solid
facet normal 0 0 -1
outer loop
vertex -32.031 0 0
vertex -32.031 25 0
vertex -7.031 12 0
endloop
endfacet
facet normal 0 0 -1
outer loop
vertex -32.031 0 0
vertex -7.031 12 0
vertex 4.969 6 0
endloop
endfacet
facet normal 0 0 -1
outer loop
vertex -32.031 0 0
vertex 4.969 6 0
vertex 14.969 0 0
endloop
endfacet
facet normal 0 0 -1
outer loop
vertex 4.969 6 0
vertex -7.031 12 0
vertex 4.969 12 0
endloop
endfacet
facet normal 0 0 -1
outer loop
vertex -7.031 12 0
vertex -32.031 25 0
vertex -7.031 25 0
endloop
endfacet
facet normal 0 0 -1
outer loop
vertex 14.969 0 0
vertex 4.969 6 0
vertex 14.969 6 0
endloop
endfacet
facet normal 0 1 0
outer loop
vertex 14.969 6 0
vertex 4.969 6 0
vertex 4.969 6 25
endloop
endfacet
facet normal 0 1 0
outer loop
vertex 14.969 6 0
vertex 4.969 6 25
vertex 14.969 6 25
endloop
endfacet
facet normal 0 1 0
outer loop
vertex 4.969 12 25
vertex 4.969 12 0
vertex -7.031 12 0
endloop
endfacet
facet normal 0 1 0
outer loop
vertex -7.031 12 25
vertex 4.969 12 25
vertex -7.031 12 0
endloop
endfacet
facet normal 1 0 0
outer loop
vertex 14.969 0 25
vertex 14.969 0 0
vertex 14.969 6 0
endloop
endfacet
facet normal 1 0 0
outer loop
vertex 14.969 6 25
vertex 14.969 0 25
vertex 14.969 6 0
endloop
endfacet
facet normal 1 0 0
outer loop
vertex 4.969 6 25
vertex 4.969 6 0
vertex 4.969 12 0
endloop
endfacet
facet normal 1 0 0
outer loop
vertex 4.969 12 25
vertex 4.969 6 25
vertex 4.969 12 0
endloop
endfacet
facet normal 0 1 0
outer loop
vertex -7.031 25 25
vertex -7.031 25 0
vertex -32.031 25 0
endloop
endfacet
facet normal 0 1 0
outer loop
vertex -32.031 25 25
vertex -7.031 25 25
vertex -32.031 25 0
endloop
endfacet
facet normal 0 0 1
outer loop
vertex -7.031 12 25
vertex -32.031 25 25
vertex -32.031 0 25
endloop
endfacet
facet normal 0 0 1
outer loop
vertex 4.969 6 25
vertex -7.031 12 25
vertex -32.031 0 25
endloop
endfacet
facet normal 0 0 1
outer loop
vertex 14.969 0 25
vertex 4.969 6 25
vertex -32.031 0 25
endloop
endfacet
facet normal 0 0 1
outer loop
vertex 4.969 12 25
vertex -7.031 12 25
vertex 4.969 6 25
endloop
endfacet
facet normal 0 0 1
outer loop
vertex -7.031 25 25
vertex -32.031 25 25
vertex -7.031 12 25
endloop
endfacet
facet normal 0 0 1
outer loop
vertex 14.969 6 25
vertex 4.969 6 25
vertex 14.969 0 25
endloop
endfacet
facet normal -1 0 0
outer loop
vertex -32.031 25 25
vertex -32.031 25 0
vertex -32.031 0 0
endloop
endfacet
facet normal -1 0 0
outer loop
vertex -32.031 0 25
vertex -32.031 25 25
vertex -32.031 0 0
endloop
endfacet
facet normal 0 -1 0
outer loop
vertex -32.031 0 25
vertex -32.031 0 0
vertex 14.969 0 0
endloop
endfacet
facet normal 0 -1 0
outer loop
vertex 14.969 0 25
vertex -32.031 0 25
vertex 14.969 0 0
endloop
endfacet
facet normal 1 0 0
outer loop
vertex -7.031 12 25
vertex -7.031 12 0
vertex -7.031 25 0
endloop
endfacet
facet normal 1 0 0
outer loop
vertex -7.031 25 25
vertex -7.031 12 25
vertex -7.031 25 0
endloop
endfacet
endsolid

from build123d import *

# Parameters (mm, degrees)
F0_W     = 10
F0_H     = 6
F1_DEPTH = 25


with BuildPart() as f1:
    # F0 (on Top) → F1 (new body)
    with BuildSketch(Plane.XY):
        Polygon((-7.03125, 25), (-32.03125, 25), (-32.03125, 0), (-7.03125, 0), (-7.03125, 12), align=None)
        Polygon((4.96875, 12), (-7.03125, 12), (-7.03125, 0), (4.96875, 0), (4.96875, 6), align=None)
        with Locations((9.96875, 3)):
            Rectangle(F0_W, F0_H)
    extrude(amount=F1_DEPTH)


solid = f1.part
